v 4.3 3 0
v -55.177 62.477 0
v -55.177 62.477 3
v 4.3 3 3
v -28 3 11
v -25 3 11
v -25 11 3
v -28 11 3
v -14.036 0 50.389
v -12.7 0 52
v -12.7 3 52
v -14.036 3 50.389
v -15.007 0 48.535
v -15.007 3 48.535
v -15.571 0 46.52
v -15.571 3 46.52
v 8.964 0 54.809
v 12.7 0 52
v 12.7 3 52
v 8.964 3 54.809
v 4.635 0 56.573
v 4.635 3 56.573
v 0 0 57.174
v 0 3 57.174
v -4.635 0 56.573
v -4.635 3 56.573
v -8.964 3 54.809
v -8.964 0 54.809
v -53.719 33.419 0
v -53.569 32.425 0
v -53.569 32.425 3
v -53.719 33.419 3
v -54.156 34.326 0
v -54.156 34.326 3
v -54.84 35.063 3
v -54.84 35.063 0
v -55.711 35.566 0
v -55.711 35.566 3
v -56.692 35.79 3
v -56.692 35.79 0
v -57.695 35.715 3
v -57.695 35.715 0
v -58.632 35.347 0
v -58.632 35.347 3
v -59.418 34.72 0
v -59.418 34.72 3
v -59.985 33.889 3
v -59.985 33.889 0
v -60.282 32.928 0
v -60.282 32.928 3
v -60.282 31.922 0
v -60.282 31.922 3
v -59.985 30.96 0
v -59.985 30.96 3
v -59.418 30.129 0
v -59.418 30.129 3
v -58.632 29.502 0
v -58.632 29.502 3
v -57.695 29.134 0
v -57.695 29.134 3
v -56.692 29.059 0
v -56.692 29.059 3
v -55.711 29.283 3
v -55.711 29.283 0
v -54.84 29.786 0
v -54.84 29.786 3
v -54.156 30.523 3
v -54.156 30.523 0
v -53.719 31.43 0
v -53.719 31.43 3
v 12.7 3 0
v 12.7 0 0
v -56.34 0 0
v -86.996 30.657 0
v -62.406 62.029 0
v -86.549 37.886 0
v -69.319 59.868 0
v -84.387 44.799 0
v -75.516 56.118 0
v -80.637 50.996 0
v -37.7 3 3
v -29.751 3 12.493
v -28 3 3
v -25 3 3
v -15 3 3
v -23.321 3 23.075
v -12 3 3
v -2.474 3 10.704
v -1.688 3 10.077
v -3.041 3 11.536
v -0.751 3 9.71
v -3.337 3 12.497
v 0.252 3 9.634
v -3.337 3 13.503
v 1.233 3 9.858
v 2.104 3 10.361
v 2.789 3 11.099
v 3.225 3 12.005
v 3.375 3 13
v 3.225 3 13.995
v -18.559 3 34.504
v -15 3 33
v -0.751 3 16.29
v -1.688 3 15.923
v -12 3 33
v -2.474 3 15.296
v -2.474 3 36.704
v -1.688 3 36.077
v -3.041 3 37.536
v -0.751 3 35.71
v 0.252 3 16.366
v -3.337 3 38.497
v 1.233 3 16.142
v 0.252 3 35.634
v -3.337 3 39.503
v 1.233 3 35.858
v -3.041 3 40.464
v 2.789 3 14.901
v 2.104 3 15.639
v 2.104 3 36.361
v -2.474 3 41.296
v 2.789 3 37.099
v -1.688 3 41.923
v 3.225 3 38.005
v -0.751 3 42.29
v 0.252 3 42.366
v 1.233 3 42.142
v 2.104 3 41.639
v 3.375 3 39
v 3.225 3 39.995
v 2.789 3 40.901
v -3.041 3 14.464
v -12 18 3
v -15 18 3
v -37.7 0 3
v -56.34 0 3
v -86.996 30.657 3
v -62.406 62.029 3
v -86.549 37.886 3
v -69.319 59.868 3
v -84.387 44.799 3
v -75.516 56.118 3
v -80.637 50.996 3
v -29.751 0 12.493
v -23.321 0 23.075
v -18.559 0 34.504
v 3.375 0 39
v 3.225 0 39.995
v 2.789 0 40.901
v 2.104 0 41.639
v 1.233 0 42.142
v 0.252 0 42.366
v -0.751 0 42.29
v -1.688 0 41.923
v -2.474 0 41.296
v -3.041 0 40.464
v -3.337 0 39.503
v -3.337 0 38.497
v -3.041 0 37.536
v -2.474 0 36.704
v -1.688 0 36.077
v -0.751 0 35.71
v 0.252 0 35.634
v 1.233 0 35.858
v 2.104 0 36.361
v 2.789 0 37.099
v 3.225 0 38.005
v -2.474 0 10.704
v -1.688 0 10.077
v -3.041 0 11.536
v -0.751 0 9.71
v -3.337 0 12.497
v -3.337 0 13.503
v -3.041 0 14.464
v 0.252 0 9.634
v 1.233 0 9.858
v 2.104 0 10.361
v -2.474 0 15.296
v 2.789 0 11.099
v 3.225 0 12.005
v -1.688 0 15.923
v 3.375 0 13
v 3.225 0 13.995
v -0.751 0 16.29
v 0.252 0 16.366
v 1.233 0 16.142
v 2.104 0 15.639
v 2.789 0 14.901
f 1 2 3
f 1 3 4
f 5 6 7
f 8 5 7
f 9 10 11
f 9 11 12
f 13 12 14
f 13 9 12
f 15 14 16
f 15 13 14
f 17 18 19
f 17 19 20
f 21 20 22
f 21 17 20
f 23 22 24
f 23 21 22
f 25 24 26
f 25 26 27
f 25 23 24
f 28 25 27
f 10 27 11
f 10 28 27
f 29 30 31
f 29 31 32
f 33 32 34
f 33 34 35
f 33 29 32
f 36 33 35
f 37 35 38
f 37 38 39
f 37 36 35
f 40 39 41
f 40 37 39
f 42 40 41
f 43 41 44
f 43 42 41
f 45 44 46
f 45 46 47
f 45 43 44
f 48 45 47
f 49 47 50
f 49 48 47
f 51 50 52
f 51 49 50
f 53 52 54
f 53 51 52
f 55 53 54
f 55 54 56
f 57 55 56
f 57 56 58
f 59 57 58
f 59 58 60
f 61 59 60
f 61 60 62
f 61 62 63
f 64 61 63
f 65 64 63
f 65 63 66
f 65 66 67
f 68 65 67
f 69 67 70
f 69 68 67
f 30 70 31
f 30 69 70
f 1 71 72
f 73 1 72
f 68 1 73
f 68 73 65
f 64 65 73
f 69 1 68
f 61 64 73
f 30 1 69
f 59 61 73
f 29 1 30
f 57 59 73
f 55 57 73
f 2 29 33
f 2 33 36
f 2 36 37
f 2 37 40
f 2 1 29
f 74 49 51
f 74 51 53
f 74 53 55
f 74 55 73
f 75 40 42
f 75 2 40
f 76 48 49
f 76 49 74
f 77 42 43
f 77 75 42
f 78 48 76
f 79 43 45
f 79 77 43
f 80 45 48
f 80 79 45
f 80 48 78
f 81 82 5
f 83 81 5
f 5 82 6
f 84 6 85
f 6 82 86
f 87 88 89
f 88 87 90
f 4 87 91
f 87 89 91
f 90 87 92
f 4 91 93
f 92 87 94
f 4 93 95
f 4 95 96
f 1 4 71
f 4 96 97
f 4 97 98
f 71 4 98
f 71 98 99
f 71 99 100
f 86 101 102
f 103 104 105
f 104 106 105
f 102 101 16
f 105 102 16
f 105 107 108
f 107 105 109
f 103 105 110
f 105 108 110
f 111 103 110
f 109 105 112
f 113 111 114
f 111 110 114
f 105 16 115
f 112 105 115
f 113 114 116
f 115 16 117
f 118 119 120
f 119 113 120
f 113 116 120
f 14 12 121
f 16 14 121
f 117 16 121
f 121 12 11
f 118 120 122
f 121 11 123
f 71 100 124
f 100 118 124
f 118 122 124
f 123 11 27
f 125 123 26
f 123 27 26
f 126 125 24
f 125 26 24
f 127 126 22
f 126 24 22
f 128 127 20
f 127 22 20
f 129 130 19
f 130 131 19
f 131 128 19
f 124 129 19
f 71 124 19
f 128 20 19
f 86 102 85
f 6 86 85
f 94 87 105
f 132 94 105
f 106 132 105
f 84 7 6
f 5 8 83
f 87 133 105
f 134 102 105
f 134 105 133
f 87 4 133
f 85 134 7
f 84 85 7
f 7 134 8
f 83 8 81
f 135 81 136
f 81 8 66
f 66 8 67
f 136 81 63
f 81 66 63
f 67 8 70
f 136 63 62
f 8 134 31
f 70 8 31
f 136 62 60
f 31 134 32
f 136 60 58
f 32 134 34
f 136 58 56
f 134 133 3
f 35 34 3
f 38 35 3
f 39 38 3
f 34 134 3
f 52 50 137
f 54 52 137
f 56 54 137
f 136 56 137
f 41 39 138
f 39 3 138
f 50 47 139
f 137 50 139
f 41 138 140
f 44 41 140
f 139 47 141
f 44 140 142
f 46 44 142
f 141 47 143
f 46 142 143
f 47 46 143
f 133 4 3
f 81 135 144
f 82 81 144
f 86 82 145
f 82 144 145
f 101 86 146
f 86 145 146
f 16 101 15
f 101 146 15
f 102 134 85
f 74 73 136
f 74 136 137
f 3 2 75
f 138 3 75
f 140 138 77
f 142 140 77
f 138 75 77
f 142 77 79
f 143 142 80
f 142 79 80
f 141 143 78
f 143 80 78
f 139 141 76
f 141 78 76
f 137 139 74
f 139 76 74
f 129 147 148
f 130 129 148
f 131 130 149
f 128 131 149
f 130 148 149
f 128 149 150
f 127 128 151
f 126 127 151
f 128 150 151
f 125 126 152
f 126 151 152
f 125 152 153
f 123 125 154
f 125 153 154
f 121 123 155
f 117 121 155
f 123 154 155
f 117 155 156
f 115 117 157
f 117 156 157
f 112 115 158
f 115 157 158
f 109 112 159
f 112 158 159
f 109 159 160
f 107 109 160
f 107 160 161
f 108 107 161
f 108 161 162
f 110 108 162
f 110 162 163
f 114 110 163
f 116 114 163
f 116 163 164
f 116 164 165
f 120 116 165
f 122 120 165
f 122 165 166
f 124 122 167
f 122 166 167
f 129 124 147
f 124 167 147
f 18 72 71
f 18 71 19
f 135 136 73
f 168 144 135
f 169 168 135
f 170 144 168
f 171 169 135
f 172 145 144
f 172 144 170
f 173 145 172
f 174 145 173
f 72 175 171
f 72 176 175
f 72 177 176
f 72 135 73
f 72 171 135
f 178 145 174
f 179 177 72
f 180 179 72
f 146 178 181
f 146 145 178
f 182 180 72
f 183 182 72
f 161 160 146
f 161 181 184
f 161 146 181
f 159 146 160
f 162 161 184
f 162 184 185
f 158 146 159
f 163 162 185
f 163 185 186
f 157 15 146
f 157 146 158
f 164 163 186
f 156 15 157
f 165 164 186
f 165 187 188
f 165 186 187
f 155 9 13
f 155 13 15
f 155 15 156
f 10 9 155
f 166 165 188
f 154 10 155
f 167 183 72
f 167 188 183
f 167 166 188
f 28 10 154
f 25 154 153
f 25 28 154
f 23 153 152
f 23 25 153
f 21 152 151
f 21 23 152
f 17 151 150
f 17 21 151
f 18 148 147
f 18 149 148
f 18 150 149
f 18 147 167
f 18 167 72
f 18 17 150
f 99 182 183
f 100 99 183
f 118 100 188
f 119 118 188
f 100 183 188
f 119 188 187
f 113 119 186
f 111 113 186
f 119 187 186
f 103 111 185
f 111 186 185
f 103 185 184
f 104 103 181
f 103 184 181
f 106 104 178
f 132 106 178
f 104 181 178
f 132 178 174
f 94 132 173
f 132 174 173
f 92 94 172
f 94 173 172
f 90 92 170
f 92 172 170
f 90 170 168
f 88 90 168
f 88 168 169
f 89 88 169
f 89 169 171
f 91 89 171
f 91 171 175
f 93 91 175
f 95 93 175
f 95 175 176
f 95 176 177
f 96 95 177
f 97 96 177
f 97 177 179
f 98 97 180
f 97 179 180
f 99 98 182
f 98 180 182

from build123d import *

# Parameters (mm, degrees)
SKETCH_R     = 3.375
PAD_DEPTH    = 3
SKETCH001_R  = 3.375
PAD001_DEPTH = 3
PAD002_DEPTH = 3
PAD003_DEPTH = 3
PAD004_DEPTH = 3


with BuildPart() as part:
    # Sketch → Pad (new body)
    with BuildSketch(Plane.XZ):
        with BuildLine():
            Line((-12.7, 0), (12.7, 0))
            Line((12.7, 0), (12.7, 52))
            ThreePointArc((12.7, 52), (0, 57.173882), (-12.7, 52))
            Line((-12.7, 52), (-12.7, 0))
        make_face()
        with Locations((0, 39)):
            Circle(SKETCH_R, mode=Mode.SUBTRACT)
        with Locations((0, 13)):
            Circle(SKETCH_R, mode=Mode.SUBTRACT)
    extrude(amount=-PAD_DEPTH)

    # Sketch001 → Pad001 (join)
    with BuildSketch(Plane.XY):
        with BuildLine():
            Line((-56.33961, 0), (-86.996465, 30.656854))
            ThreePointArc((-55.176659, 62.476659), (-78.231159, 53.711354), (-86.996465, 30.656854))
            Line((-55.176659, 62.476659), (4.3, 3))
            Line((4.3, 3), (-12.7, 3))
            Line((-12.7, 3), (-12.7, 0))
            Line((-56.33961, 0), (-12.7, 0))
        make_face()
        with Locations((-56.944426, 32.424621)):
            Circle(SKETCH001_R, mode=Mode.SUBTRACT)
    extrude(amount=PAD001_DEPTH)

    # Sketch002 → Pad002 (join)
    with BuildSketch(Plane.XZ):
        with BuildLine():
            Line((-12.7, 3), (-12.7, 52))
            ThreePointArc((-12.7, 52), (-14.569884, 49.487681), (-15.570964, 46.520182))
            ThreePointArc((-37.7, 3), (-23.321335, 23.074922), (-15.570964, 46.520182))
            Line((-12.7, 3), (-37.7, 3))
        make_face()
    extrude(amount=-PAD002_DEPTH)

    # Sketch003 → Pad003 (join)
    with BuildSketch(Plane.YZ.offset(-15)):
        Polygon((3, 3), (3, 33), (18, 3), align=None)
    extrude(amount=PAD003_DEPTH)

    # Sketch004 → Pad004 (join)
    with BuildSketch(Plane.YZ.offset(-25)):
        Polygon((3, 3), (3, 11), (11, 3), align=None)
    extrude(amount=-PAD004_DEPTH)


solid = part.part
